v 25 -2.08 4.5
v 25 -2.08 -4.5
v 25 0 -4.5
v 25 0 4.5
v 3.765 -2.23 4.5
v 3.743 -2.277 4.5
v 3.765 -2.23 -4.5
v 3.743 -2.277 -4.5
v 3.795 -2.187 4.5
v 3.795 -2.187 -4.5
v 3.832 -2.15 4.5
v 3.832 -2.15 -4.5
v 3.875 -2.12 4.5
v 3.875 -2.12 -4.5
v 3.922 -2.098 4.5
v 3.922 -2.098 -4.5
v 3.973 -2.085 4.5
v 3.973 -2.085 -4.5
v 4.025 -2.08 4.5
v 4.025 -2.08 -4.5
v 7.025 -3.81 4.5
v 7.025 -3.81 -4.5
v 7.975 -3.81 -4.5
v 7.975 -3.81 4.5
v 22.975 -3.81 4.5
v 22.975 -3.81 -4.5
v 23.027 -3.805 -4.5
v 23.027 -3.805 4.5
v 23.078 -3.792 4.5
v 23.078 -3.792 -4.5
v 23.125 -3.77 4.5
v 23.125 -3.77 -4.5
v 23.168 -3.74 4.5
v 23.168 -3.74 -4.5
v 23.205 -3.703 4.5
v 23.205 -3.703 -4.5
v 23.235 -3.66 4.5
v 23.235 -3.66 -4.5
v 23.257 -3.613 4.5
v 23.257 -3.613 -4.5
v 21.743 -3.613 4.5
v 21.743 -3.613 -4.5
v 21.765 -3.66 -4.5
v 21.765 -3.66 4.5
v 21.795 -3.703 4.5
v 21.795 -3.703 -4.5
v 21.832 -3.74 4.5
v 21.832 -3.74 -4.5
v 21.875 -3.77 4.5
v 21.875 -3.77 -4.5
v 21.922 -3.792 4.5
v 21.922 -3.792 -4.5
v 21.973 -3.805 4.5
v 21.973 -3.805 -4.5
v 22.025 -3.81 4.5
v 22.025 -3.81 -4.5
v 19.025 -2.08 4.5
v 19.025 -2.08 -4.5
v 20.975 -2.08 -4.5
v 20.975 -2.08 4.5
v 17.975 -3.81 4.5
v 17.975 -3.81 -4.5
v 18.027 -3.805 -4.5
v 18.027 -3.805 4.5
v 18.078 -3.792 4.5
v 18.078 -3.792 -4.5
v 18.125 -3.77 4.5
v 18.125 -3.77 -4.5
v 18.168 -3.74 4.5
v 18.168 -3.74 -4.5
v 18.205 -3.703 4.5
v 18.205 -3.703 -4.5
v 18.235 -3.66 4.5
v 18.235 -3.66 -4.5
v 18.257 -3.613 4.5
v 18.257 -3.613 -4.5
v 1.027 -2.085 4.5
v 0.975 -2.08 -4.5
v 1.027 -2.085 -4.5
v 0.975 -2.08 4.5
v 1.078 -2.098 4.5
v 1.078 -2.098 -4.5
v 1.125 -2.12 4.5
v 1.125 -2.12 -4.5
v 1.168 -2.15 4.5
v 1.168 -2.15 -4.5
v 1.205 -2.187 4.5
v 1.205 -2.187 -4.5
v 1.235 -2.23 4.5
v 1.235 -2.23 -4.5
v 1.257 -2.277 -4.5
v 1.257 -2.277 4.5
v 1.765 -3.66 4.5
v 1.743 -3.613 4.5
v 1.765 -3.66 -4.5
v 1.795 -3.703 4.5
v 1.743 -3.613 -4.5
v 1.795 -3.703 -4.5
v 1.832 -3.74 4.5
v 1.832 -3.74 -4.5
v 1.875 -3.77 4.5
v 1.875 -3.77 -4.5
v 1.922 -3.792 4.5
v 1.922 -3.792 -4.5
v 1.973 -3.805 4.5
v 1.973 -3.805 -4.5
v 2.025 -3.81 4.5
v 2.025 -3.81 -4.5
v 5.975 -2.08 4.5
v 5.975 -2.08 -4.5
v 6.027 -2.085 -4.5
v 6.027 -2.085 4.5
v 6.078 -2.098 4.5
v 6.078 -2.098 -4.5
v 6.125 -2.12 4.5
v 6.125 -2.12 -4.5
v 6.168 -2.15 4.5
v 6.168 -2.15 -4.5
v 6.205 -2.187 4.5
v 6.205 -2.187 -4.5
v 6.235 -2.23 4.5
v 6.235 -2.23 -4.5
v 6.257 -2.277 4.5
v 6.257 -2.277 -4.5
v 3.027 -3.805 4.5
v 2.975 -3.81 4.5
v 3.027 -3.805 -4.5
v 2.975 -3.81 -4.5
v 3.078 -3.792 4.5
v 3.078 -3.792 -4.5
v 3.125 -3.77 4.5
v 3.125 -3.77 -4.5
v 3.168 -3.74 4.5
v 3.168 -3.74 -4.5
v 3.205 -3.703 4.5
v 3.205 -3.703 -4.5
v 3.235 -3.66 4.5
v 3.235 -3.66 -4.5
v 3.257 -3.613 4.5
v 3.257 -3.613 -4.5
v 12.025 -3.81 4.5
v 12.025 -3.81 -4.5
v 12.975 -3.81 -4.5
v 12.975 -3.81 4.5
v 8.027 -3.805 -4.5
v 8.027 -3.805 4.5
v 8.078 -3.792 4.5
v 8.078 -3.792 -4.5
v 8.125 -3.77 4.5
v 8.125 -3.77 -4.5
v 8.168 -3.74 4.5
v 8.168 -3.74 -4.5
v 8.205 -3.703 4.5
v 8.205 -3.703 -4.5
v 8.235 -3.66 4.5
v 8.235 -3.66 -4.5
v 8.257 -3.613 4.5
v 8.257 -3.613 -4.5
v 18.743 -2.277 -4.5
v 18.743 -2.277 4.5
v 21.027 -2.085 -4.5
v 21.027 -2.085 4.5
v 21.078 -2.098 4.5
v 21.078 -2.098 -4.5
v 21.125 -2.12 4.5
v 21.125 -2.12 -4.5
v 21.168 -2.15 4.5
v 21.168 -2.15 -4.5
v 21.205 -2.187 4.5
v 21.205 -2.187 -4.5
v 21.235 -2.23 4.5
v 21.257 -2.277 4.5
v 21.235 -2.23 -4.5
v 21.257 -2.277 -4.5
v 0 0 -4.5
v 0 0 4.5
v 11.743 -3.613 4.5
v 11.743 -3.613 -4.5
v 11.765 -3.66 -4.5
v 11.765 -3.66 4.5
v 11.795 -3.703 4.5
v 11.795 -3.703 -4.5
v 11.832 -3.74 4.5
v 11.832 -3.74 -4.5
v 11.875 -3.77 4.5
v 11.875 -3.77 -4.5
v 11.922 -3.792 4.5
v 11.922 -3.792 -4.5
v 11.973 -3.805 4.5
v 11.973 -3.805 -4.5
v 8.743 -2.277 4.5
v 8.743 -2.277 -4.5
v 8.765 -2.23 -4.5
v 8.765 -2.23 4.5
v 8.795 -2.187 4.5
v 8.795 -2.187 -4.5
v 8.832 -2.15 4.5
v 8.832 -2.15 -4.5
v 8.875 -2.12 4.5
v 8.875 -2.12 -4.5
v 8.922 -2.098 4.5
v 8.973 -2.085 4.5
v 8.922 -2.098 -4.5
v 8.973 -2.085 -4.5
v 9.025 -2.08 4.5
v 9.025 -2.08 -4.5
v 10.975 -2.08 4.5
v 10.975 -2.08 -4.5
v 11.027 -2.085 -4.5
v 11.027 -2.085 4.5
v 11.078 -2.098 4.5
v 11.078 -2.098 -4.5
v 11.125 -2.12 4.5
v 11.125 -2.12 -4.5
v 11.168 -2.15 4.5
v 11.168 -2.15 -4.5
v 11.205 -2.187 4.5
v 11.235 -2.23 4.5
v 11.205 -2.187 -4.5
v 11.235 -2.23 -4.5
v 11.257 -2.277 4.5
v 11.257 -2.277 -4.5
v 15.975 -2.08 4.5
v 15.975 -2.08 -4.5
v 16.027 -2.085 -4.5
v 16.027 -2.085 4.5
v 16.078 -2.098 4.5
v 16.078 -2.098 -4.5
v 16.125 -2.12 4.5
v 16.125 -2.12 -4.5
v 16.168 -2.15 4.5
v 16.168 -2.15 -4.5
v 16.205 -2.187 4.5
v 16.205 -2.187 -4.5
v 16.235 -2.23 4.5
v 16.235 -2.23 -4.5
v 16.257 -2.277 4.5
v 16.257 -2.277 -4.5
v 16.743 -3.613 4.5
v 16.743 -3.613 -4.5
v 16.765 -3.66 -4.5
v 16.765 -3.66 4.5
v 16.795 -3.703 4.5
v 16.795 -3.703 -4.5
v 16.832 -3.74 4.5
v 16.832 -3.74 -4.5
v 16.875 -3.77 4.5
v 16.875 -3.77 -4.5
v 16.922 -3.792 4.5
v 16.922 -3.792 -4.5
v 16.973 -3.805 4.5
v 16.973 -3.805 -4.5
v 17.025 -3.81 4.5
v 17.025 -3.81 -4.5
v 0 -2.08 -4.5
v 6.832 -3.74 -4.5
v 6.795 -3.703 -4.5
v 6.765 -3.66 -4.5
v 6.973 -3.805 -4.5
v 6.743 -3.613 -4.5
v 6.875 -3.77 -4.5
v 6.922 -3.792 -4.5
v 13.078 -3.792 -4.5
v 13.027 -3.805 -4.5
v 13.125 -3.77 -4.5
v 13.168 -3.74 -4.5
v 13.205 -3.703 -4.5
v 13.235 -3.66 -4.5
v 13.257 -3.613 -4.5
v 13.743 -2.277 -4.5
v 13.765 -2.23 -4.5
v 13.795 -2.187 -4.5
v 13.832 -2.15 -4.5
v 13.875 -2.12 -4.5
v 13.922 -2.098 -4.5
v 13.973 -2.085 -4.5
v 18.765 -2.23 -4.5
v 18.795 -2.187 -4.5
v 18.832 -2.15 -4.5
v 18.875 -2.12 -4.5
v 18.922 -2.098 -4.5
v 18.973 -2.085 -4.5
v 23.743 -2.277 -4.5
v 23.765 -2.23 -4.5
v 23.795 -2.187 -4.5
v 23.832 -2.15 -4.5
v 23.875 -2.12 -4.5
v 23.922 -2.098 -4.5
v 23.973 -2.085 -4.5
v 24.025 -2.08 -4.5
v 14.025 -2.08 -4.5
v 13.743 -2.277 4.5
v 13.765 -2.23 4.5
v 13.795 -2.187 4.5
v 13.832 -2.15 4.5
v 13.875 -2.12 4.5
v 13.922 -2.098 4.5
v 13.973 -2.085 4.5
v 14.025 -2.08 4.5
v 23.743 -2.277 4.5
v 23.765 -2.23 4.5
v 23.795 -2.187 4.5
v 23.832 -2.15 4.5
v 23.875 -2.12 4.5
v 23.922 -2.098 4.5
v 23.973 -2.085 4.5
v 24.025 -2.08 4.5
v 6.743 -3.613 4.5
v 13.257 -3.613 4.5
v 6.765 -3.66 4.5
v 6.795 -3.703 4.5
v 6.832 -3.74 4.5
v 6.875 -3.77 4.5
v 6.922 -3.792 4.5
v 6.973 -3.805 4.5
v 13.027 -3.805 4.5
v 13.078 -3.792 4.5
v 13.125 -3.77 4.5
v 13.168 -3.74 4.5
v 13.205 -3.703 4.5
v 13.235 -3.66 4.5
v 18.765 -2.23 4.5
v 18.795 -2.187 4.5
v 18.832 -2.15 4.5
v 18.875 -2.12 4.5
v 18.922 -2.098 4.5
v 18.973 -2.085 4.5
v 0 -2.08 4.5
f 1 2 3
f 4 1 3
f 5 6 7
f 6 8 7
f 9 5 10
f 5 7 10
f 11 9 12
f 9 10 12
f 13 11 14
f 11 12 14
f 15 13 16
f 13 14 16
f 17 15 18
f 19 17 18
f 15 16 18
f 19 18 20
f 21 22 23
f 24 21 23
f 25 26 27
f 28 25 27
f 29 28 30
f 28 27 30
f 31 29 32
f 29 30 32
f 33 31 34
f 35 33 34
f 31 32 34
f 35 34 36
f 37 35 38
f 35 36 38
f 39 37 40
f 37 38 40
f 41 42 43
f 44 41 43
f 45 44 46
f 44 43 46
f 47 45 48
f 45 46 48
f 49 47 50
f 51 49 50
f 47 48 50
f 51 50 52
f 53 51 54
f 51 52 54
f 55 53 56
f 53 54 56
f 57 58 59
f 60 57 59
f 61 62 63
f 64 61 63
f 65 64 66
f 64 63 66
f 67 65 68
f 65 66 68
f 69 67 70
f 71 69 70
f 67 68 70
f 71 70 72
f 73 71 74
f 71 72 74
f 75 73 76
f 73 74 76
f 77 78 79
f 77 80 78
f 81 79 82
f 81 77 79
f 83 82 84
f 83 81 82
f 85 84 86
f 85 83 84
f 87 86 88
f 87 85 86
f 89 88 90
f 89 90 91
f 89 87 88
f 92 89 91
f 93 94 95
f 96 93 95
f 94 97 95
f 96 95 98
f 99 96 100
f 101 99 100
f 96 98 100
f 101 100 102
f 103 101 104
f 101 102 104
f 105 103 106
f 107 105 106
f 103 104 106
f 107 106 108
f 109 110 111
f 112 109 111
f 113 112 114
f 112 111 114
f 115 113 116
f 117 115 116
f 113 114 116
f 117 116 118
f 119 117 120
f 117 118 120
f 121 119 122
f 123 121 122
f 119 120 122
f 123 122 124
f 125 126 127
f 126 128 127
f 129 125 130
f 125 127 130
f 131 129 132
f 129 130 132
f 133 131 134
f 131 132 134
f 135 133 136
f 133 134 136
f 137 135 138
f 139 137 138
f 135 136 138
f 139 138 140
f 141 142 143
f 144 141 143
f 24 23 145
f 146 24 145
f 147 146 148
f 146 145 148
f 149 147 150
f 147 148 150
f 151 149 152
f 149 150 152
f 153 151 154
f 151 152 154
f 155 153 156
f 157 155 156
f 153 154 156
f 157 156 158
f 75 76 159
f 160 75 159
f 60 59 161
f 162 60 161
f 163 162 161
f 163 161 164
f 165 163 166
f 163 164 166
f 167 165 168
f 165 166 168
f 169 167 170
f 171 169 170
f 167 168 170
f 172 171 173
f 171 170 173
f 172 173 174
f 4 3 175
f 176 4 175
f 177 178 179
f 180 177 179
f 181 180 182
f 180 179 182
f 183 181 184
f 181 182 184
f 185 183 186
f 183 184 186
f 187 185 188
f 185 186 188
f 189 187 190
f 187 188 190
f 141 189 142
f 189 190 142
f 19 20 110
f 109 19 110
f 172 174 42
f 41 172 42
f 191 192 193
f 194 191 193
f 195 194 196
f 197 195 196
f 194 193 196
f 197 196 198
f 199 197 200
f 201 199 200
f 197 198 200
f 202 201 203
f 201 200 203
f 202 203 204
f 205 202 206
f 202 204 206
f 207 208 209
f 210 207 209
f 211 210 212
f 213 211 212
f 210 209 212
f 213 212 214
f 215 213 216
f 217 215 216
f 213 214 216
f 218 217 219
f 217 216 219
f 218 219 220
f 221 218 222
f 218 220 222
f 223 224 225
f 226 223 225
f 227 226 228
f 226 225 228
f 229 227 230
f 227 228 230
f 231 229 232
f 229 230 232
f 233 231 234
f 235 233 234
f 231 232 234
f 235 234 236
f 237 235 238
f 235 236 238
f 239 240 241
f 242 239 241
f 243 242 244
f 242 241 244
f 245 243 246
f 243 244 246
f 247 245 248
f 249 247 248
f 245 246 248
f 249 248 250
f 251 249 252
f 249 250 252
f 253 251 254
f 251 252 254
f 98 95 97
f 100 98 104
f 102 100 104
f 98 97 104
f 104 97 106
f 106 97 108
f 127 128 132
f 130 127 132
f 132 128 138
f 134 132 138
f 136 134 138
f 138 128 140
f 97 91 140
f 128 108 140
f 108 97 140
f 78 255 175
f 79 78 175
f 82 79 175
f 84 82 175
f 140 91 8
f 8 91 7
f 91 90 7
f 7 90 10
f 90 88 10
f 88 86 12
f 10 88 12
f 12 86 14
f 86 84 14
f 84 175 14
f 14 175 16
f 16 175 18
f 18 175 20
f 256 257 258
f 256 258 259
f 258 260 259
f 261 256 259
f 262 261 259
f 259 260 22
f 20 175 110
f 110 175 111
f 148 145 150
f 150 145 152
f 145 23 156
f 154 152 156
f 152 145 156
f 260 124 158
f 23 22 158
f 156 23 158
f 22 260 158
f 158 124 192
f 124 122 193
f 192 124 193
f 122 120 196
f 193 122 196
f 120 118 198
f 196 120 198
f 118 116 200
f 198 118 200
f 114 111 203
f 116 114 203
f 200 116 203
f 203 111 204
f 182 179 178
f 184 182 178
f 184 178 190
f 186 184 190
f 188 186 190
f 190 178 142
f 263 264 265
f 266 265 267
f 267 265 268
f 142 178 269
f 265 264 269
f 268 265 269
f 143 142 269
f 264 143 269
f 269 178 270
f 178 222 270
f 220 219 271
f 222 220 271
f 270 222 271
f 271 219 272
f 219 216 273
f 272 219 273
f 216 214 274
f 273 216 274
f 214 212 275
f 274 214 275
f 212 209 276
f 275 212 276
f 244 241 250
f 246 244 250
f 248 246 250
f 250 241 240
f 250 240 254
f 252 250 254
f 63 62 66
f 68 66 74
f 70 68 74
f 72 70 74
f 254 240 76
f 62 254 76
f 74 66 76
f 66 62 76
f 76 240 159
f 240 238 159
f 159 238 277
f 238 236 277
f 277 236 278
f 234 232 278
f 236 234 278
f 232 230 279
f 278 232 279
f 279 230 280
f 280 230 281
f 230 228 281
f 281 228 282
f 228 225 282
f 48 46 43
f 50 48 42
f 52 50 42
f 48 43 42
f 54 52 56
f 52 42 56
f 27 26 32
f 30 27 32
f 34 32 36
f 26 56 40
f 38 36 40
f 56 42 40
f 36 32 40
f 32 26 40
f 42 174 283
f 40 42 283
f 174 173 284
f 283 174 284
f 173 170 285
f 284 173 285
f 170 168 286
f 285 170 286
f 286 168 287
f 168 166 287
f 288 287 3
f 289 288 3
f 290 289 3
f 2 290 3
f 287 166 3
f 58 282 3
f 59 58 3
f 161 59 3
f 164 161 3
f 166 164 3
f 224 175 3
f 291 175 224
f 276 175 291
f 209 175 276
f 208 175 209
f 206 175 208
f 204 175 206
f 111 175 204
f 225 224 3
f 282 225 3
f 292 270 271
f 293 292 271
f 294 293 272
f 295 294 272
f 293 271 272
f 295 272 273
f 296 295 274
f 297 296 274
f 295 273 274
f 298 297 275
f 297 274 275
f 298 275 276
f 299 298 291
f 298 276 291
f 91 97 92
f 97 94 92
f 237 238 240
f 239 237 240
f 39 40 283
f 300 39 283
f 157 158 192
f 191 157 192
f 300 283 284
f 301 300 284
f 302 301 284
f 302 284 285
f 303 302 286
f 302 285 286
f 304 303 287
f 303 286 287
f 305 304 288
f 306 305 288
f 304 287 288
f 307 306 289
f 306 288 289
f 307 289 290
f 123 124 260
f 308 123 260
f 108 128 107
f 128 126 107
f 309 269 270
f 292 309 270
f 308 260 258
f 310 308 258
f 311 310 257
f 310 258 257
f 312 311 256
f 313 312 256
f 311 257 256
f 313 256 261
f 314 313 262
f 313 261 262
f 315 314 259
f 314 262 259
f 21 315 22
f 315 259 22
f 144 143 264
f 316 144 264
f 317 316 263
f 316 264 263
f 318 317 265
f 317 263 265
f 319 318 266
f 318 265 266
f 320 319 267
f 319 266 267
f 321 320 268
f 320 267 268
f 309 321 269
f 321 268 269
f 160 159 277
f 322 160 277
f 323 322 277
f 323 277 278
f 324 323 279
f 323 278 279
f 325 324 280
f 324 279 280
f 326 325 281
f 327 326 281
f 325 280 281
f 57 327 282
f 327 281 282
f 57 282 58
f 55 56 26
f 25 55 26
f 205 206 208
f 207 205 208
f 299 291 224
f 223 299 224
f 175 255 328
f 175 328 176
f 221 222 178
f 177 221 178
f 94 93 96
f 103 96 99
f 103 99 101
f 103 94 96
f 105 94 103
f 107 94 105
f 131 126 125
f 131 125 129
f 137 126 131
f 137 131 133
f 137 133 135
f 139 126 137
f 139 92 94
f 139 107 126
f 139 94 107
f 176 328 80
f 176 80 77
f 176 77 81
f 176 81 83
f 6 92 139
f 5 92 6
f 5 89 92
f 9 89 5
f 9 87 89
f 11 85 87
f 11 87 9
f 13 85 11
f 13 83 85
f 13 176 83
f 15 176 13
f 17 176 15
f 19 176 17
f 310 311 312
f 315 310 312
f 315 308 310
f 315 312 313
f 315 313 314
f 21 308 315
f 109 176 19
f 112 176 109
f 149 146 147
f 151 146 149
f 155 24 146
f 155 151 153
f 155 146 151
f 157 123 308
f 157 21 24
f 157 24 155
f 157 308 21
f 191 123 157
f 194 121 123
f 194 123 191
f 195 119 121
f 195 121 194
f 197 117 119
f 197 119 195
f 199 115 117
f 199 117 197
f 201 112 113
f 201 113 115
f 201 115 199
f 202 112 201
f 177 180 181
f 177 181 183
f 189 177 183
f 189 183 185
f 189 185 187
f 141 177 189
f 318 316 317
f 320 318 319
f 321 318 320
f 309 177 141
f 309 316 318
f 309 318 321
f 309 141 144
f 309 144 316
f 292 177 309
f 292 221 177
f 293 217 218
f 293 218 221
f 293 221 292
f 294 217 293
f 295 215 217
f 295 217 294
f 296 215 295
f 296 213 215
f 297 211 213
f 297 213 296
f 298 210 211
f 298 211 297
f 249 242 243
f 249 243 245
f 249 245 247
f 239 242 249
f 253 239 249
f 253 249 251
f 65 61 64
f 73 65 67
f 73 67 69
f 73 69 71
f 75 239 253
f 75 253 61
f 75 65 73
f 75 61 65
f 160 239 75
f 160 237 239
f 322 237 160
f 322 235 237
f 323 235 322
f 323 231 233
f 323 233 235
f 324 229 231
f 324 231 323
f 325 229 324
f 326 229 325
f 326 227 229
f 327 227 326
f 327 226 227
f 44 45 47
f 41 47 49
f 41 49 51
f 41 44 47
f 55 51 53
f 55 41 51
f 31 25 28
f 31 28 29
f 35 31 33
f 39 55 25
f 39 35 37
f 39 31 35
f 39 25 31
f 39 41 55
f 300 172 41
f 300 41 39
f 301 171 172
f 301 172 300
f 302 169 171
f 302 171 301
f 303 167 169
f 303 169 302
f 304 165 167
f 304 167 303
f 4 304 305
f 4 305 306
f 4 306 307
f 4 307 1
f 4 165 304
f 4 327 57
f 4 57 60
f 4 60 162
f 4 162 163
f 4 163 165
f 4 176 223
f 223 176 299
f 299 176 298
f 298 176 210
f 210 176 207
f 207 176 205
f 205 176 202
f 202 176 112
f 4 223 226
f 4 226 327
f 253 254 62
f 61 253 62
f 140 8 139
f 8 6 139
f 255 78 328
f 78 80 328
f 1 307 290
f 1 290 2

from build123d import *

# Parameters (mm, degrees)
BOSS_EXTRUDE1_DEPTH    = 4.5
FILLET1_R              = 0.3
LPATTERN1_COUNT        = 5
LPATTERN1_PITCH        = 5
FILLET1_OF_LPATTERN1_R = 0.3


with BuildPart() as part:
    # Sketch1 → Boss-Extrude1 (new, symmetric)
    with BuildSketch(Plane.XY):
        Polygon((0, 0), (5, 0), (5, -2.08), (3.814834253, -2.08), (3.185165747, -3.81), (1.814834253, -3.81), (1.185165747, -2.08), (0, -2.08), align=None)
    boss_extrude1 = extrude(amount=BOSS_EXTRUDE1_DEPTH, both=True)

    # Fillet1
    fillet1_edges = [part.edges().sort_by_distance(p)[0] for p in [
        (1.814834253, -3.81, 0),
        (1.185165747, -2.08, 0),
        (3.185165747, -3.81, 0),
        (3.814834253, -2.08, 0),
    ]]
    fillet(fillet1_edges, radius=FILLET1_R)

    # LPattern1: Boss-Extrude1 ×5
    with Locations(*[(i * LPATTERN1_PITCH, 0, 0) for i in range(1, LPATTERN1_COUNT)]):
        add(boss_extrude1)

    # Fillet1 of LPattern1
    fillet1_of_lpattern1_edges = [part.edges().sort_by_distance(p)[0] for p in [
        (6.814834253, -3.81, 0),
        (6.185165747, -2.08, 0),
        (8.185165747, -3.81, 0),
        (8.814834253, -2.08, 0),
        (11.814834253, -3.81, 0),
        (11.185165747, -2.08, 0),
        (13.185165747, -3.81, 0),
        (13.814834253, -2.08, 0),
        (16.814834253, -3.81, 0),
        (16.185165747, -2.08, 0),
        (18.185165747, -3.81, 0),
        (18.814834253, -2.08, 0),
        (21.814834253, -3.81, 0),
        (21.185165747, -2.08, 0),
        (23.185165747, -3.81, 0),
        (23.814834253, -2.08, 0),
    ]]
    fillet(fillet1_of_lpattern1_edges, radius=FILLET1_OF_LPATTERN1_R)


solid = part.part
